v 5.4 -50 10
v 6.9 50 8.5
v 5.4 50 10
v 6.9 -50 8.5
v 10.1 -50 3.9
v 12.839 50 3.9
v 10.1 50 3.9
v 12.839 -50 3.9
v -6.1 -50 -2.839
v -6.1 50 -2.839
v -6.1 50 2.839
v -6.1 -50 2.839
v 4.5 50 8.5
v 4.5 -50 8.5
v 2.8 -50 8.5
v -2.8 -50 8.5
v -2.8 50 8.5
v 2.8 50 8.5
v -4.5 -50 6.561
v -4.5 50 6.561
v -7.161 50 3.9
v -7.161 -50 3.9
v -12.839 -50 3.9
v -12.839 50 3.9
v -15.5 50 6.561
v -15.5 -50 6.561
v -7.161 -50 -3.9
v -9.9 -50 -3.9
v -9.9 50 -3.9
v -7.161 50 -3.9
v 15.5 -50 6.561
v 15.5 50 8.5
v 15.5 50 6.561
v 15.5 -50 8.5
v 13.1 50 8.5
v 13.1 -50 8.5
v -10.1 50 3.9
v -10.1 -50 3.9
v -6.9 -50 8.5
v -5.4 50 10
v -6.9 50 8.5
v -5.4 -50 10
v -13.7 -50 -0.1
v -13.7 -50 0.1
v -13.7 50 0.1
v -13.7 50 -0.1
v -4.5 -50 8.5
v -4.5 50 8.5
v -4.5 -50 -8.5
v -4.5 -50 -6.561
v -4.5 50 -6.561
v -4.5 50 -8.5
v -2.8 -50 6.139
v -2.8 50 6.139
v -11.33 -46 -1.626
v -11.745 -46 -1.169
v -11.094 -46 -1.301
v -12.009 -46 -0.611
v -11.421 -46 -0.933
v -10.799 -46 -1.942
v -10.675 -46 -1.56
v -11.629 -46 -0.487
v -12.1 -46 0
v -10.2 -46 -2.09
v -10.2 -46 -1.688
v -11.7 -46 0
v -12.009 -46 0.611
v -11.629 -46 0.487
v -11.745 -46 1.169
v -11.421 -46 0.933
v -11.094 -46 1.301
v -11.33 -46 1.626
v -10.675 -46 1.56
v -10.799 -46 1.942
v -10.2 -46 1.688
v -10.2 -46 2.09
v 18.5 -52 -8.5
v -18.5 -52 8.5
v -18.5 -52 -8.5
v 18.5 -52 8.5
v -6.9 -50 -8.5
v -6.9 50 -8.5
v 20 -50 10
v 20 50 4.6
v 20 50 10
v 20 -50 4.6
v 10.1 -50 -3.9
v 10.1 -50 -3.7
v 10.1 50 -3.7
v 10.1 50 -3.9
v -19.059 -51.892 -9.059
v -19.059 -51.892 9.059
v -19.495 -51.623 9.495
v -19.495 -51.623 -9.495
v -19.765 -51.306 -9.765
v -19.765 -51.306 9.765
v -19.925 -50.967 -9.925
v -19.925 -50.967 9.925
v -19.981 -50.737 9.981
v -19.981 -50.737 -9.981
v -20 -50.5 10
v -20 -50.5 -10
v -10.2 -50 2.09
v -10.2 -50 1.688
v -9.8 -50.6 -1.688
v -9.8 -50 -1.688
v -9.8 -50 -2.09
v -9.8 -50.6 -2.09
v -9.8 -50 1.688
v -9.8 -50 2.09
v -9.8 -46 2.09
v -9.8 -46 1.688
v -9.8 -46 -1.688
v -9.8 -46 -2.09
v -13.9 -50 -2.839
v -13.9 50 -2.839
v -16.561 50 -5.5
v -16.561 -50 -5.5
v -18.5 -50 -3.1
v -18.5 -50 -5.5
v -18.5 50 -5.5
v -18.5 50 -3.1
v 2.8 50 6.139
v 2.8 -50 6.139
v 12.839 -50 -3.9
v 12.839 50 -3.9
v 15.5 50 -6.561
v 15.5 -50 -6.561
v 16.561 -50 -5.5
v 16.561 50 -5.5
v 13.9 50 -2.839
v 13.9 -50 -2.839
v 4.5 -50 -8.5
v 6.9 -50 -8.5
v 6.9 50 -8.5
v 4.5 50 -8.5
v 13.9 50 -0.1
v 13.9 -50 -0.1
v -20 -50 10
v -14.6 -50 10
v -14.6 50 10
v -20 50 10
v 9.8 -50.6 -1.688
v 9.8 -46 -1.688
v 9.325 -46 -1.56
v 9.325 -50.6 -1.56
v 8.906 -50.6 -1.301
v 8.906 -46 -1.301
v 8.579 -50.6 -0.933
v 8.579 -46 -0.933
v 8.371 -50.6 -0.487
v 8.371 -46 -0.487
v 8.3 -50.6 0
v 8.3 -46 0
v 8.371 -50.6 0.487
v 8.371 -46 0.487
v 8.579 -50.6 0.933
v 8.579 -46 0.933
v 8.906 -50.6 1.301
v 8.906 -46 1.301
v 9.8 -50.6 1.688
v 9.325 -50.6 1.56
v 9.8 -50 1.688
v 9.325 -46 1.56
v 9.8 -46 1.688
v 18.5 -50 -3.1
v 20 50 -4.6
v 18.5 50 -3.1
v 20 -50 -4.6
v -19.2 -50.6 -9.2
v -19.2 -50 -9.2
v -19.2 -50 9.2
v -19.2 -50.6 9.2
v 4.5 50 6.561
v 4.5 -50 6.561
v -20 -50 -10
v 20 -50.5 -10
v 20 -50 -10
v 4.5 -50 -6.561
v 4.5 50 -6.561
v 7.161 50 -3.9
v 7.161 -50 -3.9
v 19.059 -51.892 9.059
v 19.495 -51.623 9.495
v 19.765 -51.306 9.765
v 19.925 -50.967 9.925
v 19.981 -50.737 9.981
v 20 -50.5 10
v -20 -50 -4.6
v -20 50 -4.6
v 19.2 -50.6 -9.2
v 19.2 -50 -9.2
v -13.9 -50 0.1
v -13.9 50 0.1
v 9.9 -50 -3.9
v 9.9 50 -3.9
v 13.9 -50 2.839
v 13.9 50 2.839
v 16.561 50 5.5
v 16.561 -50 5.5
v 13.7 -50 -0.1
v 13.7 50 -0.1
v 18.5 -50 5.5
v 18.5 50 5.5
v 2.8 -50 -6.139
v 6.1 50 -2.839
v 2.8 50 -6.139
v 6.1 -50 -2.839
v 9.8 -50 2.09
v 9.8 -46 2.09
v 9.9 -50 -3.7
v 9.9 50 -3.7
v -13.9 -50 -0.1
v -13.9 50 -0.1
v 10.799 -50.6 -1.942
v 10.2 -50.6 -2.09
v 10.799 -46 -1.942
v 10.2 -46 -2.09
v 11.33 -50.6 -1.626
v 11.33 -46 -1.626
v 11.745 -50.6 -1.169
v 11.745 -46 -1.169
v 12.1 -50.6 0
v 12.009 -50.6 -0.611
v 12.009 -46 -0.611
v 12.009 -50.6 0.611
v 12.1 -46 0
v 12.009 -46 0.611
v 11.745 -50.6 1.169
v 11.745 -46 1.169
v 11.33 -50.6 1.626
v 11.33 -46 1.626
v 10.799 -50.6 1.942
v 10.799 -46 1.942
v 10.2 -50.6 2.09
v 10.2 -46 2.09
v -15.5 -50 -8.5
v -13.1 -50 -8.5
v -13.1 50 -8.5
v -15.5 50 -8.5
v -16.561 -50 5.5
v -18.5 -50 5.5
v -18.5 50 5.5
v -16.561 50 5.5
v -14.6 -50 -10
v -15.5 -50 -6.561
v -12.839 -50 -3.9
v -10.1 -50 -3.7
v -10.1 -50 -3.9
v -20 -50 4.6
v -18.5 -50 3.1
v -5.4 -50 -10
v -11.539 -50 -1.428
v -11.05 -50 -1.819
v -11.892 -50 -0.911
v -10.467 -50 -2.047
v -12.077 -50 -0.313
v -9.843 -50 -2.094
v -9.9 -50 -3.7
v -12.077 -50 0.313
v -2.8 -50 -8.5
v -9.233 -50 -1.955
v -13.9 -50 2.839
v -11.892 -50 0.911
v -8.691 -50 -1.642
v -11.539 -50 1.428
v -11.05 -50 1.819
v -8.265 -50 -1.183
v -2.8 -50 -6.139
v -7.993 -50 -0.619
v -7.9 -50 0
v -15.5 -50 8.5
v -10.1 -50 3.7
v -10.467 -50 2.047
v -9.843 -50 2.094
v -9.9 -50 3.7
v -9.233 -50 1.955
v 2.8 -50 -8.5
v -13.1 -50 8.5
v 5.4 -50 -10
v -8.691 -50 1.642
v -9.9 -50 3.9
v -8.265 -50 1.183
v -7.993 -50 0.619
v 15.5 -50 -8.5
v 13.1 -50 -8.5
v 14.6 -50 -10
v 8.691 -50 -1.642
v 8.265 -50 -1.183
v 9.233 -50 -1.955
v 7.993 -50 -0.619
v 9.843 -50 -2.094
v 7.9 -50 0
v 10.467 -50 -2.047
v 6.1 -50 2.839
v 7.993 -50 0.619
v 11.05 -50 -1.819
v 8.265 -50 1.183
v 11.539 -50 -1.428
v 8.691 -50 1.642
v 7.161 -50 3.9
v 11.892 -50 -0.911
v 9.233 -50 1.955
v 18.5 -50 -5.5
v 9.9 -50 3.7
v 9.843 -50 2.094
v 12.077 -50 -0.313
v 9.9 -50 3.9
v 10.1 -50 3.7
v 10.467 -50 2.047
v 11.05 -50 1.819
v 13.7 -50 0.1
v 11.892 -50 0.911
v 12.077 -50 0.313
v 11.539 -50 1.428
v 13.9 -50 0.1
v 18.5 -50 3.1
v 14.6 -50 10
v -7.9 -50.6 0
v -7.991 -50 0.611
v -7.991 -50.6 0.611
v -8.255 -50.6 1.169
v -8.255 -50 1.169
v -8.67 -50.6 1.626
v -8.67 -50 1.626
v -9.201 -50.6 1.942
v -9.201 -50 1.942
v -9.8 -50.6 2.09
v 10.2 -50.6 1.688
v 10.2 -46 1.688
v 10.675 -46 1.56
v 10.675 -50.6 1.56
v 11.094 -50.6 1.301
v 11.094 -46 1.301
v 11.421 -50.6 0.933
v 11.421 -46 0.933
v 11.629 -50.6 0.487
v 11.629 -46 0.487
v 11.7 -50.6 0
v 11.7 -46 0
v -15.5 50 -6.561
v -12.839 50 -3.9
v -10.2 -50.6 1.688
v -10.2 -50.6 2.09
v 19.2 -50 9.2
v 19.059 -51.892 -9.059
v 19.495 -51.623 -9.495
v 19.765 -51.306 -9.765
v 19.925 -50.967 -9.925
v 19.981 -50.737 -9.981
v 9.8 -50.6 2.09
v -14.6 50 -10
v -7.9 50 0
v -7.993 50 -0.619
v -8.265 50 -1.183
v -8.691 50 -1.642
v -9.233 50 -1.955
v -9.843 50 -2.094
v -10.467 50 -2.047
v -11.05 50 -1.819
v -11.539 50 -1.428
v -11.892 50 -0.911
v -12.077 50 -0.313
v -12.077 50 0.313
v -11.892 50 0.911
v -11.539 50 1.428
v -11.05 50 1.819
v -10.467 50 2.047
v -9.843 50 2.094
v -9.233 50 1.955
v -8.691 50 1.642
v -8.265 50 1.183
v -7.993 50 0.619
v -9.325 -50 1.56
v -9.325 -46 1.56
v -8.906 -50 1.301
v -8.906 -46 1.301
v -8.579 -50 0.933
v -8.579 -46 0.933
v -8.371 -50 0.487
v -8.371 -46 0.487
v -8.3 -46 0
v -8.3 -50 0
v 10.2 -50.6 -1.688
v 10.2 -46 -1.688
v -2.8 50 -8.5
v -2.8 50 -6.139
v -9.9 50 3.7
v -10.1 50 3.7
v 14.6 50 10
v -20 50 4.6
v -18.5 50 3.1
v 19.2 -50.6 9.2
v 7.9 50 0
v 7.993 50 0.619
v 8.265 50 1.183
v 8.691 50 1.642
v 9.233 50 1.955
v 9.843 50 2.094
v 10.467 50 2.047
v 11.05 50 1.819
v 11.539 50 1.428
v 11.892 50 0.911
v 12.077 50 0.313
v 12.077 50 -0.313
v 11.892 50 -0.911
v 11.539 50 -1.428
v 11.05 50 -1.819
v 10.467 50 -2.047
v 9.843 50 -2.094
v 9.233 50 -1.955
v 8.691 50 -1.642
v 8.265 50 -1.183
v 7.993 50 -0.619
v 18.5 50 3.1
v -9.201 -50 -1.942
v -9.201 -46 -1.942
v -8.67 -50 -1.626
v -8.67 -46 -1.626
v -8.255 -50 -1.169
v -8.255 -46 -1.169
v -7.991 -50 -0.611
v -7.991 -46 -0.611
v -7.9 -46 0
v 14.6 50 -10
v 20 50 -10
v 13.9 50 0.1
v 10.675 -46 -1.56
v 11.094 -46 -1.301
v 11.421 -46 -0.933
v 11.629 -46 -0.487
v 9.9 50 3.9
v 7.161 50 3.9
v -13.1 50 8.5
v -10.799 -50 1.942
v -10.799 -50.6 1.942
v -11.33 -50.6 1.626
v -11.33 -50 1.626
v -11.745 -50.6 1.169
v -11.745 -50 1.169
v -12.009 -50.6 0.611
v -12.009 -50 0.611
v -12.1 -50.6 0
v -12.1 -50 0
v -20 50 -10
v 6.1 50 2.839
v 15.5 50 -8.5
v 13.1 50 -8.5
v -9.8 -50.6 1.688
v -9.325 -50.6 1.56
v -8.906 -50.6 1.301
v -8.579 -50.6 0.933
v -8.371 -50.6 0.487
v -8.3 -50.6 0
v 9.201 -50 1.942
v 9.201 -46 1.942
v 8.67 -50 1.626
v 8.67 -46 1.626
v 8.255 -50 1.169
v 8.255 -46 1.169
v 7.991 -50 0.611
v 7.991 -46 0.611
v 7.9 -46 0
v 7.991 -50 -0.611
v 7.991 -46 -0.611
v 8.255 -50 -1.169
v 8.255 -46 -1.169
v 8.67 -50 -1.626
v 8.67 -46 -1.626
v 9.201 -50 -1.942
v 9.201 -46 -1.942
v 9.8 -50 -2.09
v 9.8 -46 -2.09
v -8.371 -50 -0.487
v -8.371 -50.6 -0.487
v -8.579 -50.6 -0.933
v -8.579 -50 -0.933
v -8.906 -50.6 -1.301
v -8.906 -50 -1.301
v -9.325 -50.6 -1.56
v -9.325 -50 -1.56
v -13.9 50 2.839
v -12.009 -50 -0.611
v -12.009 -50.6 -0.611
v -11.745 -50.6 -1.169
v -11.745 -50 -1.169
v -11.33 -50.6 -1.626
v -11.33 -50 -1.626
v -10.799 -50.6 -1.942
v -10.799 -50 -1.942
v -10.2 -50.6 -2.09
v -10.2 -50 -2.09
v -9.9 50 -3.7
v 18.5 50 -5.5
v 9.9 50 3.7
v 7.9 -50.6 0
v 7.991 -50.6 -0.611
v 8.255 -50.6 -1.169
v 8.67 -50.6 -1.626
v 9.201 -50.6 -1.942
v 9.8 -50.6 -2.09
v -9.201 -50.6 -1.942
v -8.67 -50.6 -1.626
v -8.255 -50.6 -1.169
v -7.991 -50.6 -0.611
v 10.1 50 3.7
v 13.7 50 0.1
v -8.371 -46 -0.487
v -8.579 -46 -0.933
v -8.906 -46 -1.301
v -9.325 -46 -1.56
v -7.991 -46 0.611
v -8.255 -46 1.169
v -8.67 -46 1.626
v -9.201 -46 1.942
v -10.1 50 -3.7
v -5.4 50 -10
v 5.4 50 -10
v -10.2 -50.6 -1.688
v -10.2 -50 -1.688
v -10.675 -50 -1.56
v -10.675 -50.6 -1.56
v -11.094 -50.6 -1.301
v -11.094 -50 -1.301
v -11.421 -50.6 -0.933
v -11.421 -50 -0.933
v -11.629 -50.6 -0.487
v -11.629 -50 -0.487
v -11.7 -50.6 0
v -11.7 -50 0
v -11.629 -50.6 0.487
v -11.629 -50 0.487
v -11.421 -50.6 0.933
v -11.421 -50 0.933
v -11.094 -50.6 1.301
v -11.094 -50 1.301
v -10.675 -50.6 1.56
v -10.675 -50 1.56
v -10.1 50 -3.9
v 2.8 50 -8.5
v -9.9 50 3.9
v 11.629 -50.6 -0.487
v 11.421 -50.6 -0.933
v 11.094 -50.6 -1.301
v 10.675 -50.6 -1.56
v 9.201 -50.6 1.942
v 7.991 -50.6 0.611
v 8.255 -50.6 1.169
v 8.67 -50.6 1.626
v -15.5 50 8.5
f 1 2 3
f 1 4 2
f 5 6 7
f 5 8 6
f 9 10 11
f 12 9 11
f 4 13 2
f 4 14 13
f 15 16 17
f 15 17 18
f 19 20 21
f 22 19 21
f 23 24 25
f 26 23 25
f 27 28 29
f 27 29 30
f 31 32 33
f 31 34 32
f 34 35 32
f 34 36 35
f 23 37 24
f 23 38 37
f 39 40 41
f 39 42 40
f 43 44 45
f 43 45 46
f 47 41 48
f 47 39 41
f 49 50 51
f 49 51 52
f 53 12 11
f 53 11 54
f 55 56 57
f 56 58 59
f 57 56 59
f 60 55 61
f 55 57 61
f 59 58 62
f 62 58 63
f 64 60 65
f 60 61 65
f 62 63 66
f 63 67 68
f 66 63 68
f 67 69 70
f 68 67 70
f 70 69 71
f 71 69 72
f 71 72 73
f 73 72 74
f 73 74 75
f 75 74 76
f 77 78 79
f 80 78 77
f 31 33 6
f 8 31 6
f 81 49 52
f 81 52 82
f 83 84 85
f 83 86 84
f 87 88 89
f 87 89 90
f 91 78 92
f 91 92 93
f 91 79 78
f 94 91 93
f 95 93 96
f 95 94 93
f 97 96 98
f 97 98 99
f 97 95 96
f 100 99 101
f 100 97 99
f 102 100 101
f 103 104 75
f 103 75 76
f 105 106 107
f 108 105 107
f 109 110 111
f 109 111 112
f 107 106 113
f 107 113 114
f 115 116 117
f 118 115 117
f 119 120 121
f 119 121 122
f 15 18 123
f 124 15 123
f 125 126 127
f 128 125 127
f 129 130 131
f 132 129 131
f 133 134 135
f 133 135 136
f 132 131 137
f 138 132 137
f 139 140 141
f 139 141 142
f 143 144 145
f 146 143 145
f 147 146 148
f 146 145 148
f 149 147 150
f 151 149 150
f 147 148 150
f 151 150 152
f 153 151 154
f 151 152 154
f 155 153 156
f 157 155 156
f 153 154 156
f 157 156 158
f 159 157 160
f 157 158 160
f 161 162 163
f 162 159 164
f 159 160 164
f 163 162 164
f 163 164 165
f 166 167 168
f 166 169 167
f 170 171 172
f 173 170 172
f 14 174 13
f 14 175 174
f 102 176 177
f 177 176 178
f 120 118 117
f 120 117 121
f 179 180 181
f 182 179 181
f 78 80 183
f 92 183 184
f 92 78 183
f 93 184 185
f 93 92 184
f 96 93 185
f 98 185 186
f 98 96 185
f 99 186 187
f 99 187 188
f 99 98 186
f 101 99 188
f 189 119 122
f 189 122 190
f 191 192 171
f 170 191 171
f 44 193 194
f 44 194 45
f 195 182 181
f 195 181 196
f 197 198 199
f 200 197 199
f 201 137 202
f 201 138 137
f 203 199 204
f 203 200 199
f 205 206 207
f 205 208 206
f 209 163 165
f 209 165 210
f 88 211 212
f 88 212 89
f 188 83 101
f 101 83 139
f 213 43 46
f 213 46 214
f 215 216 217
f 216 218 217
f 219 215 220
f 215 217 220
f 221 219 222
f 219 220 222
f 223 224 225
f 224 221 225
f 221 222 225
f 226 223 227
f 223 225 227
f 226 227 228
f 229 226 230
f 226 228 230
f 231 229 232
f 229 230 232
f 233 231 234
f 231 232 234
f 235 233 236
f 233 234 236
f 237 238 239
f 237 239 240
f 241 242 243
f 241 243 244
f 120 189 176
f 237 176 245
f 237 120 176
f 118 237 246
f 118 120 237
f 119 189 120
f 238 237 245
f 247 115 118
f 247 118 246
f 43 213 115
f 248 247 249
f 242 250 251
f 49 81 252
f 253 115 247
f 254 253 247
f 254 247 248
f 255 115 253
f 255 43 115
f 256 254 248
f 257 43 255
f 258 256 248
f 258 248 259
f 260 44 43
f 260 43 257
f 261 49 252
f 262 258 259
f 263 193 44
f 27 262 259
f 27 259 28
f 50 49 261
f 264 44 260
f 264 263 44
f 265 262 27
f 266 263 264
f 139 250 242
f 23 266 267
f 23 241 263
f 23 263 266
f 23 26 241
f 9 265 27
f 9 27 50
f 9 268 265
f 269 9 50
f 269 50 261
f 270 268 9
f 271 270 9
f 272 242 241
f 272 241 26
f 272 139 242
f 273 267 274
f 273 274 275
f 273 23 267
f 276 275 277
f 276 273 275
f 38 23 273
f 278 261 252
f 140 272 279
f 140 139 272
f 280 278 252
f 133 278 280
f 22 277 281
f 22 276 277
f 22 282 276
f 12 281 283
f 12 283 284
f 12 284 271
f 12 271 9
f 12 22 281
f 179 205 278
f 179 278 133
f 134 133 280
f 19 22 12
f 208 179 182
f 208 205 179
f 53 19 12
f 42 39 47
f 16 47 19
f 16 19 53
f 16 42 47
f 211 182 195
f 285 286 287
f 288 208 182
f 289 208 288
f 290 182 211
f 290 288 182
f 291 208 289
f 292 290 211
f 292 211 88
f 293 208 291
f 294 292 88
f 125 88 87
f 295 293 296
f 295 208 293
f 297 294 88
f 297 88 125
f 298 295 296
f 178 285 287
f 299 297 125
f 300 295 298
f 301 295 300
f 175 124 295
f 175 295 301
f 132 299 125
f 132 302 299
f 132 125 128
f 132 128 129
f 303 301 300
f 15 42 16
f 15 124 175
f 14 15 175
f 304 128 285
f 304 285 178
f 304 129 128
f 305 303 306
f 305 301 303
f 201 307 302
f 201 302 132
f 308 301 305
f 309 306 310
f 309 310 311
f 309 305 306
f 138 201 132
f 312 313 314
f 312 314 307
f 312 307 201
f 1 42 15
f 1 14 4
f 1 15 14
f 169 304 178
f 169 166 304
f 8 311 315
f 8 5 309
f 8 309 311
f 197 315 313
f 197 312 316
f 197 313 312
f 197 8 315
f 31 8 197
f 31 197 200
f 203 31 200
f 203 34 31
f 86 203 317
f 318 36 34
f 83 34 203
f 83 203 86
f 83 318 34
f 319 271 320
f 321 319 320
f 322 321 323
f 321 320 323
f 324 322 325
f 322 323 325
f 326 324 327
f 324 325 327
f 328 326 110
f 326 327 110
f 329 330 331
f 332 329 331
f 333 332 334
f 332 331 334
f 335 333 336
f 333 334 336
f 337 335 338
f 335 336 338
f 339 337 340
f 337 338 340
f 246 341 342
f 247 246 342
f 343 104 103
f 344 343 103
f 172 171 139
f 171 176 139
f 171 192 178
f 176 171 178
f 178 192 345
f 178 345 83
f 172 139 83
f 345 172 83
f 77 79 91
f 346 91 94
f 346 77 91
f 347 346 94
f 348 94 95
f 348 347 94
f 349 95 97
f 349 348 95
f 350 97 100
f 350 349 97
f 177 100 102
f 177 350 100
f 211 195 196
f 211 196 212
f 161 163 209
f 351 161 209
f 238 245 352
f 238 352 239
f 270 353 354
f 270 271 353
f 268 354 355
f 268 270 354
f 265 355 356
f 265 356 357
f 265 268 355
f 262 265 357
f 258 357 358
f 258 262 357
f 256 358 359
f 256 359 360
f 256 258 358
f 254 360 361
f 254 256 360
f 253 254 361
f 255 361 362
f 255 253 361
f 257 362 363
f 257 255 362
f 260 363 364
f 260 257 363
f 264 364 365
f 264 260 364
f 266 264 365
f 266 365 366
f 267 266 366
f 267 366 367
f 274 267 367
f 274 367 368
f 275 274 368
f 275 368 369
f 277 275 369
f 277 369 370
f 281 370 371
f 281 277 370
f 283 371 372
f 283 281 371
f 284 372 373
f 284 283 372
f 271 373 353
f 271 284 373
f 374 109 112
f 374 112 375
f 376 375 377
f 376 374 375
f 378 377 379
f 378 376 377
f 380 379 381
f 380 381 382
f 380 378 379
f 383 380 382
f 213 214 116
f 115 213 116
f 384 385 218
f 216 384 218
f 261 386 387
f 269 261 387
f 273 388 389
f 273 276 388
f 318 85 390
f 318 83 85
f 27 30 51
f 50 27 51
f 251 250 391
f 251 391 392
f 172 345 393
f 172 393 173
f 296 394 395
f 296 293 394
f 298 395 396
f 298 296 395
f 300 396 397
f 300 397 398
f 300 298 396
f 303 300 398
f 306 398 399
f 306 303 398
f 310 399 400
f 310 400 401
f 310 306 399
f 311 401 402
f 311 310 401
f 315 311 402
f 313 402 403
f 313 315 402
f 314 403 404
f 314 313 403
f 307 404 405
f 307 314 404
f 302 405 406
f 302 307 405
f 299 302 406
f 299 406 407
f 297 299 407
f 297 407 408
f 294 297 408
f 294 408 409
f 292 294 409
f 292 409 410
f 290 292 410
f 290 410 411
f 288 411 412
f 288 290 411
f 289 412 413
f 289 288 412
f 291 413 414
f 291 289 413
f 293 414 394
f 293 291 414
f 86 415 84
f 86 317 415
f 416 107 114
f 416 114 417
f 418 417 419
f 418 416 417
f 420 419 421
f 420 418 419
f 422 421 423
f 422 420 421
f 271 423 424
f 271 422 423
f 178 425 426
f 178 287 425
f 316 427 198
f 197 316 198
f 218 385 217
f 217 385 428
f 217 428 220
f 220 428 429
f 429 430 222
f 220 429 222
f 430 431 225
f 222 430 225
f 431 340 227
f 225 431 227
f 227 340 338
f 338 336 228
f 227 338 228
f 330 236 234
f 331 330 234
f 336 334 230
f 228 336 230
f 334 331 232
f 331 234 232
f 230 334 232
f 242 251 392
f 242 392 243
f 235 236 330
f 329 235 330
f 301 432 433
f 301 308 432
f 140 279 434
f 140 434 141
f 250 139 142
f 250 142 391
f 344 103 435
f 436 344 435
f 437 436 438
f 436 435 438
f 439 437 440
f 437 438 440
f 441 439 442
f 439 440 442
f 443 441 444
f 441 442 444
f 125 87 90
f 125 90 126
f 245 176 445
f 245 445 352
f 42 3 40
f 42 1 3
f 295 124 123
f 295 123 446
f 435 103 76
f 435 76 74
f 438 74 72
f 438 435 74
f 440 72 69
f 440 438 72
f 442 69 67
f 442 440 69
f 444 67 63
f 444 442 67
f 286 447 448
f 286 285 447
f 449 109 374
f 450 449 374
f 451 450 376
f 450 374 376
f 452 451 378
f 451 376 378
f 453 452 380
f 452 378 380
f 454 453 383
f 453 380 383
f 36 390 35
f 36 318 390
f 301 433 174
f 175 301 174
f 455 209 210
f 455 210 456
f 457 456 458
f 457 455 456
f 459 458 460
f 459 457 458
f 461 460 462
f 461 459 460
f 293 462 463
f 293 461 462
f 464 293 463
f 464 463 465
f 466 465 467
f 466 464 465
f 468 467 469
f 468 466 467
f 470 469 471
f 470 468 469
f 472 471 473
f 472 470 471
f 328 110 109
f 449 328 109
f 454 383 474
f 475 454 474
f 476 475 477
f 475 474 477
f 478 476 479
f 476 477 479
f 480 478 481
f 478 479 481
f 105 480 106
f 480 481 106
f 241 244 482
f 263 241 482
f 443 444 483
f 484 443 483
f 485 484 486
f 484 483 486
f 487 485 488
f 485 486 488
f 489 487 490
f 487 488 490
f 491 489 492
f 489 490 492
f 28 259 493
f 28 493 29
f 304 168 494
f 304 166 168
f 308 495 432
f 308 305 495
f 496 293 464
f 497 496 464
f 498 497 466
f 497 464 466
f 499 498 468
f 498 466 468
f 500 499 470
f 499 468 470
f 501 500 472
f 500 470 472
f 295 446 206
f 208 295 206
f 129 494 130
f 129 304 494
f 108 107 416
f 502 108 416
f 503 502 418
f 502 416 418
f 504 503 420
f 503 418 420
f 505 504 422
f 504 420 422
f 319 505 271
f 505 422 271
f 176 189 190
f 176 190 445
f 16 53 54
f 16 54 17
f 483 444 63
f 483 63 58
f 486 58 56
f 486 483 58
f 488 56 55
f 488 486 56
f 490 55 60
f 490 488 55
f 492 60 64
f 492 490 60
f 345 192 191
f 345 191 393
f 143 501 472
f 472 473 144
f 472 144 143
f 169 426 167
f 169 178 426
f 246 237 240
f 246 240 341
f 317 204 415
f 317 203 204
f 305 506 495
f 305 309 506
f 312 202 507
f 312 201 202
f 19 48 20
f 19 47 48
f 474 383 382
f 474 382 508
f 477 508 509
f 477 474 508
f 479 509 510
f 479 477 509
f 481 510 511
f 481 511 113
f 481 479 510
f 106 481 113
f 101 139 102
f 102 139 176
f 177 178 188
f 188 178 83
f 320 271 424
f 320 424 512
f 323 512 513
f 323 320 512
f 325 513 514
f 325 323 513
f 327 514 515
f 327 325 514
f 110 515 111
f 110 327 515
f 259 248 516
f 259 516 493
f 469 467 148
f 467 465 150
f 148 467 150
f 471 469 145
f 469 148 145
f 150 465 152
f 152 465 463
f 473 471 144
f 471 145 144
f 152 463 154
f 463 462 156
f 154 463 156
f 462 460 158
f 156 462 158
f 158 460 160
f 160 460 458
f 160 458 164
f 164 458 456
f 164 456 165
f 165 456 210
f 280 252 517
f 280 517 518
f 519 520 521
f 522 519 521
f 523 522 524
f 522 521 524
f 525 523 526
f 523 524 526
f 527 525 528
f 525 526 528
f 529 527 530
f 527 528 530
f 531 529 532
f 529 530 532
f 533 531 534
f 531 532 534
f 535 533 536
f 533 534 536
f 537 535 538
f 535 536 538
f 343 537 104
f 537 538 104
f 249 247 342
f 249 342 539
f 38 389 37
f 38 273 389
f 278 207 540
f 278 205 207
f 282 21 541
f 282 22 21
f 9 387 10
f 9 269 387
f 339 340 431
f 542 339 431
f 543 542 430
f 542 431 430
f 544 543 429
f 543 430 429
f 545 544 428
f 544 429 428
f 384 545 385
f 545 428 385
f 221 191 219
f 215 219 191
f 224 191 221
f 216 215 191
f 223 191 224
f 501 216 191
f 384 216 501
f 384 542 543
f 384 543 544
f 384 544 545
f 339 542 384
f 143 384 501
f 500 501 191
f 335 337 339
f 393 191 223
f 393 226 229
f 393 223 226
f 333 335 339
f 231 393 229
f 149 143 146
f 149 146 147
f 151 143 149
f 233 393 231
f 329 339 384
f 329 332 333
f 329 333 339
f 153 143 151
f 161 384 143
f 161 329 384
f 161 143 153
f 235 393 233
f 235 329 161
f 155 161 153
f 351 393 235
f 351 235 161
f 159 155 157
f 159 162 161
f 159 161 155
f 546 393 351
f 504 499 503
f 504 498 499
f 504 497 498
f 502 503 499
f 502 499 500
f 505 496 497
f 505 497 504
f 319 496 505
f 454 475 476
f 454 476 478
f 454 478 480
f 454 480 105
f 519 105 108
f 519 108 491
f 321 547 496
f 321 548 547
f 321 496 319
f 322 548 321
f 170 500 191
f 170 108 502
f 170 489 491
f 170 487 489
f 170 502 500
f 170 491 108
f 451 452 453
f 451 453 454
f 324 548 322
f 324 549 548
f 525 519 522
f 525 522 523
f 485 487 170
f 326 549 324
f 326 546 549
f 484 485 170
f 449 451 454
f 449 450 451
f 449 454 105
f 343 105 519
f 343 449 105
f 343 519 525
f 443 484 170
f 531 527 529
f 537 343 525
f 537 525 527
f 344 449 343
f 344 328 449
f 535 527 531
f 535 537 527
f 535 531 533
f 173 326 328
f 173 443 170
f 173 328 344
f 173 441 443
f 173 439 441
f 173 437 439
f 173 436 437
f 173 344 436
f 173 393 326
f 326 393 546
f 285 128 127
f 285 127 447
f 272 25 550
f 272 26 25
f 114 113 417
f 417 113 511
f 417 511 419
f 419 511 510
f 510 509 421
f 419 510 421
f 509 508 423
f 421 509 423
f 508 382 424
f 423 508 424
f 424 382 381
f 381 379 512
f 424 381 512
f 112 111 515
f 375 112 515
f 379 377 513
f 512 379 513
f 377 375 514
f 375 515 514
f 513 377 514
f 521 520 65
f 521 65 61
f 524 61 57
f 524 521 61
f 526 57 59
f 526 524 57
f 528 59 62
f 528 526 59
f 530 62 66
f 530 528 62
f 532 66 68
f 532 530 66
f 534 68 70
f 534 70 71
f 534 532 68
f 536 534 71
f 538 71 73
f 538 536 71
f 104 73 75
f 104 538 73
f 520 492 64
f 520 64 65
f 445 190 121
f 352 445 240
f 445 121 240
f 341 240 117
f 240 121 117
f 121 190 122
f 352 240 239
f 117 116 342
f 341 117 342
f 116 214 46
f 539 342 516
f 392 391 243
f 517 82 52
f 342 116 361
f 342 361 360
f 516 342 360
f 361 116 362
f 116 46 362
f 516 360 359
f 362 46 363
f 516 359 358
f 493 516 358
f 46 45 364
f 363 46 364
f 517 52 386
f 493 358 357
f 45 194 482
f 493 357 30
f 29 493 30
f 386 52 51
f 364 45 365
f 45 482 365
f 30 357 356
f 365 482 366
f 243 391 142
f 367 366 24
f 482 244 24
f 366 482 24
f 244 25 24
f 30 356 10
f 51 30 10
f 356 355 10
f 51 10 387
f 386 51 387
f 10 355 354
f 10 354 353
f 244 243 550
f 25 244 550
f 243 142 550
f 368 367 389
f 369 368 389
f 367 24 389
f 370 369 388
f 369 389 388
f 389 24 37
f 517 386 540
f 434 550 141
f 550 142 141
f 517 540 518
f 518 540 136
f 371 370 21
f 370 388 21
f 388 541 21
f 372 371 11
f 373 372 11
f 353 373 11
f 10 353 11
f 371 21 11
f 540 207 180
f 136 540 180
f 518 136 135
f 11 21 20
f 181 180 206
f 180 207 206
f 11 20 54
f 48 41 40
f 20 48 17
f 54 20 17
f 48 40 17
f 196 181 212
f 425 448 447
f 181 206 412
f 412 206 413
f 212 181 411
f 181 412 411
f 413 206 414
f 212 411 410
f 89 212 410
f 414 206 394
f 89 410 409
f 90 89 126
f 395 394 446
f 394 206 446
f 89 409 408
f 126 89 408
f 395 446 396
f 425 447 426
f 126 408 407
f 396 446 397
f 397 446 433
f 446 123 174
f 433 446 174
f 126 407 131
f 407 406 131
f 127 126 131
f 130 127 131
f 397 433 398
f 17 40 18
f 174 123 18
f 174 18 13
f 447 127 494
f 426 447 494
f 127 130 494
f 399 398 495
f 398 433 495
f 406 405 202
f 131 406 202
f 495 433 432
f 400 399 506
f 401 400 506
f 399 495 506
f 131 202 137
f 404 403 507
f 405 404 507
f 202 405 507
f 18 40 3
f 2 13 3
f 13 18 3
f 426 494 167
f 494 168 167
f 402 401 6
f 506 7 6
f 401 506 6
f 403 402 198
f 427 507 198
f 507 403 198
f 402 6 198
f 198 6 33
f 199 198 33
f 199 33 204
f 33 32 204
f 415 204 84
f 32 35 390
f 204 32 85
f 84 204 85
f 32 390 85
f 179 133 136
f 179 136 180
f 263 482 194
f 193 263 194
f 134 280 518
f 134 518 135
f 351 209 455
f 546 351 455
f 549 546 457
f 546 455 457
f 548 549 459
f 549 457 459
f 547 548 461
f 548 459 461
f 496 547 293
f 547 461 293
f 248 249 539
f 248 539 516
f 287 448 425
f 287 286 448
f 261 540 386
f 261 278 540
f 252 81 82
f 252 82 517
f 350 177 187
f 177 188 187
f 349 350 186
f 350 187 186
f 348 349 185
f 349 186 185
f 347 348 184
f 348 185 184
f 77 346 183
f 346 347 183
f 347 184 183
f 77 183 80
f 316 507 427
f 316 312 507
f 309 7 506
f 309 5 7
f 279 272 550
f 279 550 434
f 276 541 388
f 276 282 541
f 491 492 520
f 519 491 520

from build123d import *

# Parameters (mm, degrees)
F1_DEPTH      = 50
F3_DEPTH      = 2
F4_W          = 38.4
F4_H          = 18.3999997326
F5_DEPTH      = 0.6
F6_DEPTH      = 4
F6_DEPTH_BACK = 1
F7_R          = 1.5


with BuildPart() as f1:
    # F0 (on Front) → F1 (new body, symmetric)
    with BuildSketch(Plane.XZ):
        Polygon((-15.5, 6.5606601718), (-15.5, 8.4999998663), (-13.1, 8.4999998663), (-14.6, 9.9999998663), (-20, 9.9999998663), (-20, 4.5999998663), (-18.4999998663, 3.1), (-18.4999998663, 5.5), (-16.5606601718, 5.5), (-13.9, 2.8393398282), (-13.9, 0.1), (-13.7, 0.1), (-13.7, 0), (-13.7, -0.1), (-13.9, -0.1), (-13.9, -2.8393398282), (-16.5606601718, -5.5), (-18.4999998663, -5.5), (-18.4999998663, -3.1), (-20, -4.5999998663), (-20, -9.9999998663), (-14.6, -9.9999998663), (-13.1, -8.4999998663), (-15.5, -8.4999998663), (-15.5, -6.5606601718), (-12.8393398282, -3.9), (-10.1, -3.9), (-10.1, -3.7), (-9.9, -3.7), (-9.9, -3.9), (-7.1606601718, -3.9), (-4.5, -6.5606601718), (-4.5, -8.4999998663), (-6.9, -8.4999998663), (-5.4, -9.9999998663), (0, -9.9999998663), (5.4, -9.9999998663), (6.9, -8.4999998663), (4.5, -8.4999998663), (4.5, -6.5606601718), (7.1606601718, -3.9), (9.9, -3.9), (9.9, -3.7), (10.1, -3.7), (10.1, -3.9), (12.8393398282, -3.9), (15.5, -6.5606601718), (15.5, -8.4999998663), (13.1, -8.4999998663), (14.6, -9.9999998663), (20, -9.9999998663), (20, -4.5999998663), (18.4999998663, -3.1), (18.4999998663, -5.5), (16.5606601718, -5.5), (13.9, -2.8393398282), (13.9, -0.1), (13.7, -0.1), (13.7, 0), (13.7, 0.1), (13.9, 0.1), (13.9, 2.8393398282), (16.5606601718, 5.5), (18.4999998663, 5.5), (18.4999998663, 3.1), (20, 4.5999998663), (20, 9.9999998663), (14.6, 9.9999998663), (13.1, 8.4999998663), (15.5, 8.4999998663), (15.5, 6.5606601718), (12.8393398282, 3.9), (10.1, 3.9), (10.1, 3.7), (9.9, 3.7), (9.9, 3.9), (7.1606601718, 3.9), (4.5, 6.5606601718), (4.5, 8.4999998663), (6.9, 8.4999998663), (5.4, 9.9999998663), (0, 9.9999998663), (-5.4, 9.9999998663), (-6.9, 8.4999998663), (-4.5, 8.4999998663), (-4.5, 6.5606601718), (-7.1606601718, 3.9), (-9.9, 3.9), (-9.9, 3.7), (-10.1, 3.7), (-10.1, 3.9), (-12.8393398282, 3.9), align=None)
        with BuildLine():
            ThreePointArc((-12.1, 0), (-10, 2.1), (-7.9, 0))
            ThreePointArc((-7.9, 0), (-10, -2.1), (-12.1, 0))
        make_face(mode=Mode.SUBTRACT)
        Polygon((-6.1, 2.8393398282), (-2.8, 6.1393398282), (-2.8, 8.4999998663), (0, 8.4999998663), (2.8, 8.4999998663), (2.8, 6.1393398282), (6.1, 2.8393398282), (6.1, 0), (6.1, -2.8393398282), (2.8, -6.1393398282), (2.8, -8.4999998663), (0, -8.4999998663), (-2.8, -8.4999998663), (-2.8, -6.1393398282), (-6.1, -2.8393398282), (-6.1, 0), align=None, mode=Mode.SUBTRACT)
        with BuildLine():
            ThreePointArc((12.1, 0), (10, -2.1), (7.9, 0))
            ThreePointArc((7.9, 0), (10, 2.1), (12.1, 0))
        make_face(mode=Mode.SUBTRACT)
    extrude(amount=F1_DEPTH, both=True)


with BuildPart() as f3:
    # F2 (on face) → F3 (new body)
    with BuildSketch(Plane.XZ.offset(50)):
        Polygon((-14.6, 9.9999998663), (-20, 9.9999998663), (-20, 4.5999998663), (-18.4999998663, 3.1), (-18.4999998663, 5.5), (-16.5606601718, 5.5), (-13.9, 2.8393398282), (-13.9, 0.1), (-13.7, 0.1), (-13.7, -0.1), (-13.9, -0.1), (-13.9, -2.8393398282), (-16.5606601718, -5.5), (-18.4999998663, -5.5), (-18.4999998663, -3.1), (-20, -4.5999998663), (-20, -9.9999998663), (-14.6, -9.9999998663), (-13.1, -8.4999998663), (-15.5, -8.4999998663), (-15.5, -6.5606601718), (-12.8393398282, -3.9), (-10.1, -3.9), (-10.1, -3.7), (-9.9, -3.7), (-9.9, -3.9), (-7.1606601718, -3.9), (-4.5, -6.5606601718), (-4.5, -8.4999998663), (-6.9, -8.4999998663), (-5.4, -9.9999998663), (5.4, -9.9999998663), (6.9, -8.4999998663), (4.5, -8.4999998663), (4.5, -6.5606601718), (7.1606601718, -3.9), (9.9, -3.9), (9.9, -3.7), (10.1, -3.7), (10.1, -3.9), (12.8393398282, -3.9), (15.5, -6.5606601718), (15.5, -8.4999998663), (13.1, -8.4999998663), (14.6, -9.9999998663), (20, -9.9999998663), (20, -4.5999998663), (18.4999998663, -3.1), (18.4999998663, -5.5), (16.5606601718, -5.5), (13.9, -2.8393398282), (13.9, -0.1), (13.7, -0.1), (13.7, 0.1), (13.9, 0.1), (13.9, 2.8393398282), (16.5606601718, 5.5), (18.4999998663, 5.5), (18.4999998663, 3.1), (20, 4.5999998663), (20, 9.9999998663), (14.6, 9.9999998663), (13.1, 8.4999998663), (15.5, 8.4999998663), (15.5, 6.5606601718), (12.8393398282, 3.9), (10.1, 3.9), (10.1, 3.7), (9.9, 3.7), (9.9, 3.9), (7.1606601718, 3.9), (4.5, 6.5606601718), (4.5, 8.4999998663), (6.9, 8.4999998663), (5.4, 9.9999998663), (-5.4, 9.9999998663), (-6.9, 8.4999998663), (-4.5, 8.4999998663), (-4.5, 6.5606601718), (-7.1606601718, 3.9), (-9.9, 3.9), (-9.9, 3.7), (-10.1, 3.7), (-10.1, 3.9), (-12.8393398282, 3.9), (-15.5, 6.5606601718), (-15.5, 8.4999998663), (-13.1, 8.4999998663), align=None)
        with BuildLine():
            ThreePointArc((-9.8, 2.090454496), (-8.4459729732, 1.4124446892), (-7.9, 0))
            ThreePointArc((-7.9, 0), (-8.4459729732, -1.4124446892), (-9.8, -2.090454496))
            ThreePointArc((-9.8, -2.090454496), (-10, -2.1), (-10.2, -2.090454496))
            ThreePointArc((-10.2, -2.090454496), (-11.5540270268, -1.4124446892), (-12.1, 0))
            ThreePointArc((-12.1, 0), (-11.5540270268, 1.4124446892), (-10.2, 2.090454496))
            ThreePointArc((-10.2, 2.090454496), (-10, 2.1), (-9.8, 2.090454496))
        make_face(mode=Mode.SUBTRACT)
        Polygon((6.1, -2.8393398282), (2.8, -6.1393398282), (2.8, -8.4999998663), (0, -8.4999998663), (-2.8, -8.4999998663), (-2.8, -6.1393398282), (-6.1, -2.8393398282), (-6.1, 0), (-6.1, 2.8393398282), (-2.8, 6.1393398282), (-2.8, 8.4999998663), (0, 8.4999998663), (2.8, 8.4999998663), (2.8, 6.1393398282), (6.1, 2.8393398282), (6.1, 0), align=None, mode=Mode.SUBTRACT)
        with BuildLine():
            ThreePointArc((10.2, 2.090454496), (11.5540270268, 1.4124446892), (12.1, 0))
            ThreePointArc((12.1, 0), (11.5540270268, -1.4124446892), (10.2, -2.090454496))
            ThreePointArc((10.2, -2.090454496), (10, -2.1), (9.8, -2.090454496))
            ThreePointArc((9.8, -2.090454496), (8.4459729732, -1.4124446892), (7.9, 0))
            ThreePointArc((7.9, 0), (8.4459729732, 1.4124446892), (9.8, 2.090454496))
            ThreePointArc((9.8, 2.090454496), (10, 2.1), (10.2, 2.090454496))
        make_face(mode=Mode.SUBTRACT)
        Polygon((2.8, -8.4999998663), (2.8, -6.1393398282), (6.1, -2.8393398282), (6.1, 0), (6.1, 2.8393398282), (2.8, 6.1393398282), (2.8, 8.4999998663), (0, 8.4999998663), (-2.8, 8.4999998663), (-2.8, 6.1393398282), (-6.1, 2.8393398282), (-6.1, 0), (-6.1, -2.8393398282), (-2.8, -6.1393398282), (-2.8, -8.4999998663), (0, -8.4999998663), align=None)
        Polygon((20, -4.5999998663), (20, 4.5999998663), (18.4999998663, 3.1), (18.4999998663, 5.5), (16.5606601718, 5.5), (13.9, 2.8393398282), (13.9, 0.1), (13.7, 0.1), (13.7, -0.1), (13.9, -0.1), (13.9, -2.8393398282), (16.5606601718, -5.5), (18.4999998663, -5.5), (18.4999998663, -3.1), align=None)
        Polygon((-18.4999998663, 3.1), (-20, 4.5999998663), (-20, -4.5999998663), (-18.4999998663, -3.1), (-18.4999998663, -5.5), (-16.5606601718, -5.5), (-13.9, -2.8393398282), (-13.9, -0.1), (-13.7, -0.1), (-13.7, 0.1), (-13.9, 0.1), (-13.9, 2.8393398282), (-16.5606601718, 5.5), (-18.4999998663, 5.5), align=None)
        Polygon((-5.4, 9.9999998663), (-14.6, 9.9999998663), (-13.1, 8.4999998663), (-15.5, 8.4999998663), (-15.5, 6.5606601718), (-12.8393398282, 3.9), (-10.1, 3.9), (-10.1, 3.7), (-9.9, 3.7), (-9.9, 3.9), (-7.1606601718, 3.9), (-4.5, 6.5606601718), (-4.5, 8.4999998663), (-6.9, 8.4999998663), align=None)
        Polygon((14.6, 9.9999998663), (5.4, 9.9999998663), (6.9, 8.4999998663), (4.5, 8.4999998663), (4.5, 6.5606601718), (7.1606601718, 3.9), (9.9, 3.9), (9.9, 3.7), (10.1, 3.7), (10.1, 3.9), (12.8393398282, 3.9), (15.5, 6.5606601718), (15.5, 8.4999998663), (13.1, 8.4999998663), align=None)
        Polygon((6.9, -8.4999998663), (5.4, -9.9999998663), (14.6, -9.9999998663), (13.1, -8.4999998663), (15.5, -8.4999998663), (15.5, -6.5606601718), (12.8393398282, -3.9), (10.1, -3.9), (10.1, -3.7), (9.9, -3.7), (9.9, -3.9), (7.1606601718, -3.9), (4.5, -6.5606601718), (4.5, -8.4999998663), align=None)
        Polygon((-13.1, -8.4999998663), (-14.6, -9.9999998663), (-5.4, -9.9999998663), (-6.9, -8.4999998663), (-4.5, -8.4999998663), (-4.5, -6.5606601718), (-7.1606601718, -3.9), (-9.9, -3.9), (-9.9, -3.7), (-10.1, -3.7), (-10.1, -3.9), (-12.8393398282, -3.9), (-15.5, -6.5606601718), (-15.5, -8.4999998663), align=None)
        with BuildLine():
            ThreePointArc((-8.3, 0), (-8.7291734973, 1.1291589791), (-9.8, 1.6881943016))
            ThreePointArc((-9.8, 1.6881943016), (-10, 1.7), (-10.2, 1.6881943016))
            ThreePointArc((-10.2, 1.6881943016), (-11.7, 0), (-10.2, -1.6881943016))
            ThreePointArc((-10.2, -1.6881943016), (-10, -1.7), (-9.8, -1.6881943016))
            ThreePointArc((-9.8, -1.6881943016), (-8.7291734973, -1.1291589791), (-8.3, 0))
        make_face()
        with BuildLine():
            ThreePointArc((11.7, 0), (11.2708265027, 1.1291589791), (10.2, 1.6881943016))
            ThreePointArc((10.2, 1.6881943016), (10, 1.7), (9.8, 1.6881943016))
            ThreePointArc((9.8, 1.6881943016), (8.3, 0), (9.8, -1.6881943016))
            ThreePointArc((9.8, -1.6881943016), (10, -1.7), (10.2, -1.6881943016))
            ThreePointArc((10.2, -1.6881943016), (11.2708265027, -1.1291589791), (11.7, 0))
        make_face()
        with BuildLine():
            Line((9.8, 1.6881943016), (9.8, 2.090454496))
            ThreePointArc((9.8, 2.090454496), (8.4459729732, 1.4124446892), (7.9, 0))
            ThreePointArc((7.9, 0), (8.4459729732, -1.4124446892), (9.8, -2.090454496))
            Line((9.8, -2.090454496), (9.8, -1.6881943016))
            ThreePointArc((9.8, -1.6881943016), (8.3, 0), (9.8, 1.6881943016))
        make_face()
        with BuildLine():
            ThreePointArc((10.2, -2.090454496), (11.5540270268, -1.4124446892), (12.1, 0))
            ThreePointArc((12.1, 0), (11.5540270268, 1.4124446892), (10.2, 2.090454496))
            Line((10.2, 2.090454496), (10.2, 1.6881943016))
            ThreePointArc((10.2, 1.6881943016), (11.2708265027, 1.1291589791), (11.7, 0))
            ThreePointArc((11.7, 0), (11.2708265027, -1.1291589791), (10.2, -1.6881943016))
            Line((10.2, -1.6881943016), (10.2, -2.090454496))
        make_face()
        with BuildLine():
            Line((-10.2, 1.6881943016), (-10.2, 2.090454496))
            ThreePointArc((-10.2, 2.090454496), (-11.5540270268, 1.4124446892), (-12.1, 0))
            ThreePointArc((-12.1, 0), (-11.5540270268, -1.4124446892), (-10.2, -2.090454496))
            Line((-10.2, -2.090454496), (-10.2, -1.6881943016))
            ThreePointArc((-10.2, -1.6881943016), (-11.7, 0), (-10.2, 1.6881943016))
        make_face()
        with BuildLine():
            ThreePointArc((-9.8, -2.090454496), (-8.4459729732, -1.4124446892), (-7.9, 0))
            ThreePointArc((-7.9, 0), (-8.4459729732, 1.4124446892), (-9.8, 2.090454496))
            Line((-9.8, 2.090454496), (-9.8, 1.6881943016))
            ThreePointArc((-9.8, 1.6881943016), (-8.7291734973, 1.1291589791), (-8.3, 0))
            ThreePointArc((-8.3, 0), (-8.7291734973, -1.1291589791), (-9.8, -1.6881943016))
            Line((-9.8, -1.6881943016), (-9.8, -2.090454496))
        make_face()
        with BuildLine():
            Line((10.2, 1.6881943016), (10.2, 2.090454496))
            ThreePointArc((10.2, 2.090454496), (10, 2.1), (9.8, 2.090454496))
            Line((9.8, 2.090454496), (9.8, 1.6881943016))
            ThreePointArc((9.8, 1.6881943016), (10, 1.7), (10.2, 1.6881943016))
        make_face()
        with BuildLine():
            ThreePointArc((9.8, -2.090454496), (10, -2.1), (10.2, -2.090454496))
            Line((10.2, -2.090454496), (10.2, -1.6881943016))
            ThreePointArc((10.2, -1.6881943016), (10, -1.7), (9.8, -1.6881943016))
            Line((9.8, -1.6881943016), (9.8, -2.090454496))
        make_face()
        with BuildLine():
            Line((-9.8, 1.6881943016), (-9.8, 2.090454496))
            ThreePointArc((-9.8, 2.090454496), (-10, 2.1), (-10.2, 2.090454496))
            Line((-10.2, 2.090454496), (-10.2, 1.6881943016))
            ThreePointArc((-10.2, 1.6881943016), (-10, 1.7), (-9.8, 1.6881943016))
        make_face()
        with BuildLine():
            ThreePointArc((-10.2, -2.090454496), (-10, -2.1), (-9.8, -2.090454496))
            Line((-9.8, -2.090454496), (-9.8, -1.6881943016))
            ThreePointArc((-9.8, -1.6881943016), (-10, -1.7), (-10.2, -1.6881943016))
            Line((-10.2, -1.6881943016), (-10.2, -2.090454496))
        make_face()
    extrude(amount=F3_DEPTH)

    # F4 (on face) → F5 (cut)
    with BuildSketch(Plane(origin=(0, -50, 0), x_dir=(-1, 0, 0), z_dir=(0, 1, 0))):
        Rectangle(F4_W, F4_H)
    extrude(amount=-F5_DEPTH, mode=Mode.SUBTRACT)

    # F2 (on face) → F6 (join, two sides)
    with BuildSketch(Plane.XZ.offset(50)) as f6_sk:
        with BuildLine():
            ThreePointArc((10.2, -2.090454496), (11.5540270268, -1.4124446892), (12.1, 0))
            ThreePointArc((12.1, 0), (11.5540270268, 1.4124446892), (10.2, 2.090454496))
            Line((10.2, 2.090454496), (10.2, 1.6881943016))
            ThreePointArc((10.2, 1.6881943016), (11.2708265027, 1.1291589791), (11.7, 0))
            ThreePointArc((11.7, 0), (11.2708265027, -1.1291589791), (10.2, -1.6881943016))
            Line((10.2, -1.6881943016), (10.2, -2.090454496))
        make_face()
        with BuildLine():
            Line((9.8, 1.6881943016), (9.8, 2.090454496))
            ThreePointArc((9.8, 2.090454496), (8.4459729732, 1.4124446892), (7.9, 0))
            ThreePointArc((7.9, 0), (8.4459729732, -1.4124446892), (9.8, -2.090454496))
            Line((9.8, -2.090454496), (9.8, -1.6881943016))
            ThreePointArc((9.8, -1.6881943016), (8.3, 0), (9.8, 1.6881943016))
        make_face()
        with BuildLine():
            ThreePointArc((-9.8, -2.090454496), (-8.4459729732, -1.4124446892), (-7.9, 0))
            ThreePointArc((-7.9, 0), (-8.4459729732, 1.4124446892), (-9.8, 2.090454496))
            Line((-9.8, 2.090454496), (-9.8, 1.6881943016))
            ThreePointArc((-9.8, 1.6881943016), (-8.7291734973, 1.1291589791), (-8.3, 0))
            ThreePointArc((-8.3, 0), (-8.7291734973, -1.1291589791), (-9.8, -1.6881943016))
            Line((-9.8, -1.6881943016), (-9.8, -2.090454496))
        make_face()
        with BuildLine():
            Line((-10.2, 1.6881943016), (-10.2, 2.090454496))
            ThreePointArc((-10.2, 2.090454496), (-11.5540270268, 1.4124446892), (-12.1, 0))
            ThreePointArc((-12.1, 0), (-11.5540270268, -1.4124446892), (-10.2, -2.090454496))
            Line((-10.2, -2.090454496), (-10.2, -1.6881943016))
            ThreePointArc((-10.2, -1.6881943016), (-11.7, 0), (-10.2, 1.6881943016))
        make_face()
    extrude(amount=-F6_DEPTH)
    extrude(f6_sk.sketch, amount=F6_DEPTH_BACK)

    # F7
    f7_edges = [f3.edges().sort_by_distance(p)[0] for p in [
        (0, -52, 10),
        (-20, -52, 0),
        (0, -52, -10),
        (20, -52, 0),
    ]]
    fillet(f7_edges, radius=F7_R)


solid = Compound([f1.part, f3.part])
